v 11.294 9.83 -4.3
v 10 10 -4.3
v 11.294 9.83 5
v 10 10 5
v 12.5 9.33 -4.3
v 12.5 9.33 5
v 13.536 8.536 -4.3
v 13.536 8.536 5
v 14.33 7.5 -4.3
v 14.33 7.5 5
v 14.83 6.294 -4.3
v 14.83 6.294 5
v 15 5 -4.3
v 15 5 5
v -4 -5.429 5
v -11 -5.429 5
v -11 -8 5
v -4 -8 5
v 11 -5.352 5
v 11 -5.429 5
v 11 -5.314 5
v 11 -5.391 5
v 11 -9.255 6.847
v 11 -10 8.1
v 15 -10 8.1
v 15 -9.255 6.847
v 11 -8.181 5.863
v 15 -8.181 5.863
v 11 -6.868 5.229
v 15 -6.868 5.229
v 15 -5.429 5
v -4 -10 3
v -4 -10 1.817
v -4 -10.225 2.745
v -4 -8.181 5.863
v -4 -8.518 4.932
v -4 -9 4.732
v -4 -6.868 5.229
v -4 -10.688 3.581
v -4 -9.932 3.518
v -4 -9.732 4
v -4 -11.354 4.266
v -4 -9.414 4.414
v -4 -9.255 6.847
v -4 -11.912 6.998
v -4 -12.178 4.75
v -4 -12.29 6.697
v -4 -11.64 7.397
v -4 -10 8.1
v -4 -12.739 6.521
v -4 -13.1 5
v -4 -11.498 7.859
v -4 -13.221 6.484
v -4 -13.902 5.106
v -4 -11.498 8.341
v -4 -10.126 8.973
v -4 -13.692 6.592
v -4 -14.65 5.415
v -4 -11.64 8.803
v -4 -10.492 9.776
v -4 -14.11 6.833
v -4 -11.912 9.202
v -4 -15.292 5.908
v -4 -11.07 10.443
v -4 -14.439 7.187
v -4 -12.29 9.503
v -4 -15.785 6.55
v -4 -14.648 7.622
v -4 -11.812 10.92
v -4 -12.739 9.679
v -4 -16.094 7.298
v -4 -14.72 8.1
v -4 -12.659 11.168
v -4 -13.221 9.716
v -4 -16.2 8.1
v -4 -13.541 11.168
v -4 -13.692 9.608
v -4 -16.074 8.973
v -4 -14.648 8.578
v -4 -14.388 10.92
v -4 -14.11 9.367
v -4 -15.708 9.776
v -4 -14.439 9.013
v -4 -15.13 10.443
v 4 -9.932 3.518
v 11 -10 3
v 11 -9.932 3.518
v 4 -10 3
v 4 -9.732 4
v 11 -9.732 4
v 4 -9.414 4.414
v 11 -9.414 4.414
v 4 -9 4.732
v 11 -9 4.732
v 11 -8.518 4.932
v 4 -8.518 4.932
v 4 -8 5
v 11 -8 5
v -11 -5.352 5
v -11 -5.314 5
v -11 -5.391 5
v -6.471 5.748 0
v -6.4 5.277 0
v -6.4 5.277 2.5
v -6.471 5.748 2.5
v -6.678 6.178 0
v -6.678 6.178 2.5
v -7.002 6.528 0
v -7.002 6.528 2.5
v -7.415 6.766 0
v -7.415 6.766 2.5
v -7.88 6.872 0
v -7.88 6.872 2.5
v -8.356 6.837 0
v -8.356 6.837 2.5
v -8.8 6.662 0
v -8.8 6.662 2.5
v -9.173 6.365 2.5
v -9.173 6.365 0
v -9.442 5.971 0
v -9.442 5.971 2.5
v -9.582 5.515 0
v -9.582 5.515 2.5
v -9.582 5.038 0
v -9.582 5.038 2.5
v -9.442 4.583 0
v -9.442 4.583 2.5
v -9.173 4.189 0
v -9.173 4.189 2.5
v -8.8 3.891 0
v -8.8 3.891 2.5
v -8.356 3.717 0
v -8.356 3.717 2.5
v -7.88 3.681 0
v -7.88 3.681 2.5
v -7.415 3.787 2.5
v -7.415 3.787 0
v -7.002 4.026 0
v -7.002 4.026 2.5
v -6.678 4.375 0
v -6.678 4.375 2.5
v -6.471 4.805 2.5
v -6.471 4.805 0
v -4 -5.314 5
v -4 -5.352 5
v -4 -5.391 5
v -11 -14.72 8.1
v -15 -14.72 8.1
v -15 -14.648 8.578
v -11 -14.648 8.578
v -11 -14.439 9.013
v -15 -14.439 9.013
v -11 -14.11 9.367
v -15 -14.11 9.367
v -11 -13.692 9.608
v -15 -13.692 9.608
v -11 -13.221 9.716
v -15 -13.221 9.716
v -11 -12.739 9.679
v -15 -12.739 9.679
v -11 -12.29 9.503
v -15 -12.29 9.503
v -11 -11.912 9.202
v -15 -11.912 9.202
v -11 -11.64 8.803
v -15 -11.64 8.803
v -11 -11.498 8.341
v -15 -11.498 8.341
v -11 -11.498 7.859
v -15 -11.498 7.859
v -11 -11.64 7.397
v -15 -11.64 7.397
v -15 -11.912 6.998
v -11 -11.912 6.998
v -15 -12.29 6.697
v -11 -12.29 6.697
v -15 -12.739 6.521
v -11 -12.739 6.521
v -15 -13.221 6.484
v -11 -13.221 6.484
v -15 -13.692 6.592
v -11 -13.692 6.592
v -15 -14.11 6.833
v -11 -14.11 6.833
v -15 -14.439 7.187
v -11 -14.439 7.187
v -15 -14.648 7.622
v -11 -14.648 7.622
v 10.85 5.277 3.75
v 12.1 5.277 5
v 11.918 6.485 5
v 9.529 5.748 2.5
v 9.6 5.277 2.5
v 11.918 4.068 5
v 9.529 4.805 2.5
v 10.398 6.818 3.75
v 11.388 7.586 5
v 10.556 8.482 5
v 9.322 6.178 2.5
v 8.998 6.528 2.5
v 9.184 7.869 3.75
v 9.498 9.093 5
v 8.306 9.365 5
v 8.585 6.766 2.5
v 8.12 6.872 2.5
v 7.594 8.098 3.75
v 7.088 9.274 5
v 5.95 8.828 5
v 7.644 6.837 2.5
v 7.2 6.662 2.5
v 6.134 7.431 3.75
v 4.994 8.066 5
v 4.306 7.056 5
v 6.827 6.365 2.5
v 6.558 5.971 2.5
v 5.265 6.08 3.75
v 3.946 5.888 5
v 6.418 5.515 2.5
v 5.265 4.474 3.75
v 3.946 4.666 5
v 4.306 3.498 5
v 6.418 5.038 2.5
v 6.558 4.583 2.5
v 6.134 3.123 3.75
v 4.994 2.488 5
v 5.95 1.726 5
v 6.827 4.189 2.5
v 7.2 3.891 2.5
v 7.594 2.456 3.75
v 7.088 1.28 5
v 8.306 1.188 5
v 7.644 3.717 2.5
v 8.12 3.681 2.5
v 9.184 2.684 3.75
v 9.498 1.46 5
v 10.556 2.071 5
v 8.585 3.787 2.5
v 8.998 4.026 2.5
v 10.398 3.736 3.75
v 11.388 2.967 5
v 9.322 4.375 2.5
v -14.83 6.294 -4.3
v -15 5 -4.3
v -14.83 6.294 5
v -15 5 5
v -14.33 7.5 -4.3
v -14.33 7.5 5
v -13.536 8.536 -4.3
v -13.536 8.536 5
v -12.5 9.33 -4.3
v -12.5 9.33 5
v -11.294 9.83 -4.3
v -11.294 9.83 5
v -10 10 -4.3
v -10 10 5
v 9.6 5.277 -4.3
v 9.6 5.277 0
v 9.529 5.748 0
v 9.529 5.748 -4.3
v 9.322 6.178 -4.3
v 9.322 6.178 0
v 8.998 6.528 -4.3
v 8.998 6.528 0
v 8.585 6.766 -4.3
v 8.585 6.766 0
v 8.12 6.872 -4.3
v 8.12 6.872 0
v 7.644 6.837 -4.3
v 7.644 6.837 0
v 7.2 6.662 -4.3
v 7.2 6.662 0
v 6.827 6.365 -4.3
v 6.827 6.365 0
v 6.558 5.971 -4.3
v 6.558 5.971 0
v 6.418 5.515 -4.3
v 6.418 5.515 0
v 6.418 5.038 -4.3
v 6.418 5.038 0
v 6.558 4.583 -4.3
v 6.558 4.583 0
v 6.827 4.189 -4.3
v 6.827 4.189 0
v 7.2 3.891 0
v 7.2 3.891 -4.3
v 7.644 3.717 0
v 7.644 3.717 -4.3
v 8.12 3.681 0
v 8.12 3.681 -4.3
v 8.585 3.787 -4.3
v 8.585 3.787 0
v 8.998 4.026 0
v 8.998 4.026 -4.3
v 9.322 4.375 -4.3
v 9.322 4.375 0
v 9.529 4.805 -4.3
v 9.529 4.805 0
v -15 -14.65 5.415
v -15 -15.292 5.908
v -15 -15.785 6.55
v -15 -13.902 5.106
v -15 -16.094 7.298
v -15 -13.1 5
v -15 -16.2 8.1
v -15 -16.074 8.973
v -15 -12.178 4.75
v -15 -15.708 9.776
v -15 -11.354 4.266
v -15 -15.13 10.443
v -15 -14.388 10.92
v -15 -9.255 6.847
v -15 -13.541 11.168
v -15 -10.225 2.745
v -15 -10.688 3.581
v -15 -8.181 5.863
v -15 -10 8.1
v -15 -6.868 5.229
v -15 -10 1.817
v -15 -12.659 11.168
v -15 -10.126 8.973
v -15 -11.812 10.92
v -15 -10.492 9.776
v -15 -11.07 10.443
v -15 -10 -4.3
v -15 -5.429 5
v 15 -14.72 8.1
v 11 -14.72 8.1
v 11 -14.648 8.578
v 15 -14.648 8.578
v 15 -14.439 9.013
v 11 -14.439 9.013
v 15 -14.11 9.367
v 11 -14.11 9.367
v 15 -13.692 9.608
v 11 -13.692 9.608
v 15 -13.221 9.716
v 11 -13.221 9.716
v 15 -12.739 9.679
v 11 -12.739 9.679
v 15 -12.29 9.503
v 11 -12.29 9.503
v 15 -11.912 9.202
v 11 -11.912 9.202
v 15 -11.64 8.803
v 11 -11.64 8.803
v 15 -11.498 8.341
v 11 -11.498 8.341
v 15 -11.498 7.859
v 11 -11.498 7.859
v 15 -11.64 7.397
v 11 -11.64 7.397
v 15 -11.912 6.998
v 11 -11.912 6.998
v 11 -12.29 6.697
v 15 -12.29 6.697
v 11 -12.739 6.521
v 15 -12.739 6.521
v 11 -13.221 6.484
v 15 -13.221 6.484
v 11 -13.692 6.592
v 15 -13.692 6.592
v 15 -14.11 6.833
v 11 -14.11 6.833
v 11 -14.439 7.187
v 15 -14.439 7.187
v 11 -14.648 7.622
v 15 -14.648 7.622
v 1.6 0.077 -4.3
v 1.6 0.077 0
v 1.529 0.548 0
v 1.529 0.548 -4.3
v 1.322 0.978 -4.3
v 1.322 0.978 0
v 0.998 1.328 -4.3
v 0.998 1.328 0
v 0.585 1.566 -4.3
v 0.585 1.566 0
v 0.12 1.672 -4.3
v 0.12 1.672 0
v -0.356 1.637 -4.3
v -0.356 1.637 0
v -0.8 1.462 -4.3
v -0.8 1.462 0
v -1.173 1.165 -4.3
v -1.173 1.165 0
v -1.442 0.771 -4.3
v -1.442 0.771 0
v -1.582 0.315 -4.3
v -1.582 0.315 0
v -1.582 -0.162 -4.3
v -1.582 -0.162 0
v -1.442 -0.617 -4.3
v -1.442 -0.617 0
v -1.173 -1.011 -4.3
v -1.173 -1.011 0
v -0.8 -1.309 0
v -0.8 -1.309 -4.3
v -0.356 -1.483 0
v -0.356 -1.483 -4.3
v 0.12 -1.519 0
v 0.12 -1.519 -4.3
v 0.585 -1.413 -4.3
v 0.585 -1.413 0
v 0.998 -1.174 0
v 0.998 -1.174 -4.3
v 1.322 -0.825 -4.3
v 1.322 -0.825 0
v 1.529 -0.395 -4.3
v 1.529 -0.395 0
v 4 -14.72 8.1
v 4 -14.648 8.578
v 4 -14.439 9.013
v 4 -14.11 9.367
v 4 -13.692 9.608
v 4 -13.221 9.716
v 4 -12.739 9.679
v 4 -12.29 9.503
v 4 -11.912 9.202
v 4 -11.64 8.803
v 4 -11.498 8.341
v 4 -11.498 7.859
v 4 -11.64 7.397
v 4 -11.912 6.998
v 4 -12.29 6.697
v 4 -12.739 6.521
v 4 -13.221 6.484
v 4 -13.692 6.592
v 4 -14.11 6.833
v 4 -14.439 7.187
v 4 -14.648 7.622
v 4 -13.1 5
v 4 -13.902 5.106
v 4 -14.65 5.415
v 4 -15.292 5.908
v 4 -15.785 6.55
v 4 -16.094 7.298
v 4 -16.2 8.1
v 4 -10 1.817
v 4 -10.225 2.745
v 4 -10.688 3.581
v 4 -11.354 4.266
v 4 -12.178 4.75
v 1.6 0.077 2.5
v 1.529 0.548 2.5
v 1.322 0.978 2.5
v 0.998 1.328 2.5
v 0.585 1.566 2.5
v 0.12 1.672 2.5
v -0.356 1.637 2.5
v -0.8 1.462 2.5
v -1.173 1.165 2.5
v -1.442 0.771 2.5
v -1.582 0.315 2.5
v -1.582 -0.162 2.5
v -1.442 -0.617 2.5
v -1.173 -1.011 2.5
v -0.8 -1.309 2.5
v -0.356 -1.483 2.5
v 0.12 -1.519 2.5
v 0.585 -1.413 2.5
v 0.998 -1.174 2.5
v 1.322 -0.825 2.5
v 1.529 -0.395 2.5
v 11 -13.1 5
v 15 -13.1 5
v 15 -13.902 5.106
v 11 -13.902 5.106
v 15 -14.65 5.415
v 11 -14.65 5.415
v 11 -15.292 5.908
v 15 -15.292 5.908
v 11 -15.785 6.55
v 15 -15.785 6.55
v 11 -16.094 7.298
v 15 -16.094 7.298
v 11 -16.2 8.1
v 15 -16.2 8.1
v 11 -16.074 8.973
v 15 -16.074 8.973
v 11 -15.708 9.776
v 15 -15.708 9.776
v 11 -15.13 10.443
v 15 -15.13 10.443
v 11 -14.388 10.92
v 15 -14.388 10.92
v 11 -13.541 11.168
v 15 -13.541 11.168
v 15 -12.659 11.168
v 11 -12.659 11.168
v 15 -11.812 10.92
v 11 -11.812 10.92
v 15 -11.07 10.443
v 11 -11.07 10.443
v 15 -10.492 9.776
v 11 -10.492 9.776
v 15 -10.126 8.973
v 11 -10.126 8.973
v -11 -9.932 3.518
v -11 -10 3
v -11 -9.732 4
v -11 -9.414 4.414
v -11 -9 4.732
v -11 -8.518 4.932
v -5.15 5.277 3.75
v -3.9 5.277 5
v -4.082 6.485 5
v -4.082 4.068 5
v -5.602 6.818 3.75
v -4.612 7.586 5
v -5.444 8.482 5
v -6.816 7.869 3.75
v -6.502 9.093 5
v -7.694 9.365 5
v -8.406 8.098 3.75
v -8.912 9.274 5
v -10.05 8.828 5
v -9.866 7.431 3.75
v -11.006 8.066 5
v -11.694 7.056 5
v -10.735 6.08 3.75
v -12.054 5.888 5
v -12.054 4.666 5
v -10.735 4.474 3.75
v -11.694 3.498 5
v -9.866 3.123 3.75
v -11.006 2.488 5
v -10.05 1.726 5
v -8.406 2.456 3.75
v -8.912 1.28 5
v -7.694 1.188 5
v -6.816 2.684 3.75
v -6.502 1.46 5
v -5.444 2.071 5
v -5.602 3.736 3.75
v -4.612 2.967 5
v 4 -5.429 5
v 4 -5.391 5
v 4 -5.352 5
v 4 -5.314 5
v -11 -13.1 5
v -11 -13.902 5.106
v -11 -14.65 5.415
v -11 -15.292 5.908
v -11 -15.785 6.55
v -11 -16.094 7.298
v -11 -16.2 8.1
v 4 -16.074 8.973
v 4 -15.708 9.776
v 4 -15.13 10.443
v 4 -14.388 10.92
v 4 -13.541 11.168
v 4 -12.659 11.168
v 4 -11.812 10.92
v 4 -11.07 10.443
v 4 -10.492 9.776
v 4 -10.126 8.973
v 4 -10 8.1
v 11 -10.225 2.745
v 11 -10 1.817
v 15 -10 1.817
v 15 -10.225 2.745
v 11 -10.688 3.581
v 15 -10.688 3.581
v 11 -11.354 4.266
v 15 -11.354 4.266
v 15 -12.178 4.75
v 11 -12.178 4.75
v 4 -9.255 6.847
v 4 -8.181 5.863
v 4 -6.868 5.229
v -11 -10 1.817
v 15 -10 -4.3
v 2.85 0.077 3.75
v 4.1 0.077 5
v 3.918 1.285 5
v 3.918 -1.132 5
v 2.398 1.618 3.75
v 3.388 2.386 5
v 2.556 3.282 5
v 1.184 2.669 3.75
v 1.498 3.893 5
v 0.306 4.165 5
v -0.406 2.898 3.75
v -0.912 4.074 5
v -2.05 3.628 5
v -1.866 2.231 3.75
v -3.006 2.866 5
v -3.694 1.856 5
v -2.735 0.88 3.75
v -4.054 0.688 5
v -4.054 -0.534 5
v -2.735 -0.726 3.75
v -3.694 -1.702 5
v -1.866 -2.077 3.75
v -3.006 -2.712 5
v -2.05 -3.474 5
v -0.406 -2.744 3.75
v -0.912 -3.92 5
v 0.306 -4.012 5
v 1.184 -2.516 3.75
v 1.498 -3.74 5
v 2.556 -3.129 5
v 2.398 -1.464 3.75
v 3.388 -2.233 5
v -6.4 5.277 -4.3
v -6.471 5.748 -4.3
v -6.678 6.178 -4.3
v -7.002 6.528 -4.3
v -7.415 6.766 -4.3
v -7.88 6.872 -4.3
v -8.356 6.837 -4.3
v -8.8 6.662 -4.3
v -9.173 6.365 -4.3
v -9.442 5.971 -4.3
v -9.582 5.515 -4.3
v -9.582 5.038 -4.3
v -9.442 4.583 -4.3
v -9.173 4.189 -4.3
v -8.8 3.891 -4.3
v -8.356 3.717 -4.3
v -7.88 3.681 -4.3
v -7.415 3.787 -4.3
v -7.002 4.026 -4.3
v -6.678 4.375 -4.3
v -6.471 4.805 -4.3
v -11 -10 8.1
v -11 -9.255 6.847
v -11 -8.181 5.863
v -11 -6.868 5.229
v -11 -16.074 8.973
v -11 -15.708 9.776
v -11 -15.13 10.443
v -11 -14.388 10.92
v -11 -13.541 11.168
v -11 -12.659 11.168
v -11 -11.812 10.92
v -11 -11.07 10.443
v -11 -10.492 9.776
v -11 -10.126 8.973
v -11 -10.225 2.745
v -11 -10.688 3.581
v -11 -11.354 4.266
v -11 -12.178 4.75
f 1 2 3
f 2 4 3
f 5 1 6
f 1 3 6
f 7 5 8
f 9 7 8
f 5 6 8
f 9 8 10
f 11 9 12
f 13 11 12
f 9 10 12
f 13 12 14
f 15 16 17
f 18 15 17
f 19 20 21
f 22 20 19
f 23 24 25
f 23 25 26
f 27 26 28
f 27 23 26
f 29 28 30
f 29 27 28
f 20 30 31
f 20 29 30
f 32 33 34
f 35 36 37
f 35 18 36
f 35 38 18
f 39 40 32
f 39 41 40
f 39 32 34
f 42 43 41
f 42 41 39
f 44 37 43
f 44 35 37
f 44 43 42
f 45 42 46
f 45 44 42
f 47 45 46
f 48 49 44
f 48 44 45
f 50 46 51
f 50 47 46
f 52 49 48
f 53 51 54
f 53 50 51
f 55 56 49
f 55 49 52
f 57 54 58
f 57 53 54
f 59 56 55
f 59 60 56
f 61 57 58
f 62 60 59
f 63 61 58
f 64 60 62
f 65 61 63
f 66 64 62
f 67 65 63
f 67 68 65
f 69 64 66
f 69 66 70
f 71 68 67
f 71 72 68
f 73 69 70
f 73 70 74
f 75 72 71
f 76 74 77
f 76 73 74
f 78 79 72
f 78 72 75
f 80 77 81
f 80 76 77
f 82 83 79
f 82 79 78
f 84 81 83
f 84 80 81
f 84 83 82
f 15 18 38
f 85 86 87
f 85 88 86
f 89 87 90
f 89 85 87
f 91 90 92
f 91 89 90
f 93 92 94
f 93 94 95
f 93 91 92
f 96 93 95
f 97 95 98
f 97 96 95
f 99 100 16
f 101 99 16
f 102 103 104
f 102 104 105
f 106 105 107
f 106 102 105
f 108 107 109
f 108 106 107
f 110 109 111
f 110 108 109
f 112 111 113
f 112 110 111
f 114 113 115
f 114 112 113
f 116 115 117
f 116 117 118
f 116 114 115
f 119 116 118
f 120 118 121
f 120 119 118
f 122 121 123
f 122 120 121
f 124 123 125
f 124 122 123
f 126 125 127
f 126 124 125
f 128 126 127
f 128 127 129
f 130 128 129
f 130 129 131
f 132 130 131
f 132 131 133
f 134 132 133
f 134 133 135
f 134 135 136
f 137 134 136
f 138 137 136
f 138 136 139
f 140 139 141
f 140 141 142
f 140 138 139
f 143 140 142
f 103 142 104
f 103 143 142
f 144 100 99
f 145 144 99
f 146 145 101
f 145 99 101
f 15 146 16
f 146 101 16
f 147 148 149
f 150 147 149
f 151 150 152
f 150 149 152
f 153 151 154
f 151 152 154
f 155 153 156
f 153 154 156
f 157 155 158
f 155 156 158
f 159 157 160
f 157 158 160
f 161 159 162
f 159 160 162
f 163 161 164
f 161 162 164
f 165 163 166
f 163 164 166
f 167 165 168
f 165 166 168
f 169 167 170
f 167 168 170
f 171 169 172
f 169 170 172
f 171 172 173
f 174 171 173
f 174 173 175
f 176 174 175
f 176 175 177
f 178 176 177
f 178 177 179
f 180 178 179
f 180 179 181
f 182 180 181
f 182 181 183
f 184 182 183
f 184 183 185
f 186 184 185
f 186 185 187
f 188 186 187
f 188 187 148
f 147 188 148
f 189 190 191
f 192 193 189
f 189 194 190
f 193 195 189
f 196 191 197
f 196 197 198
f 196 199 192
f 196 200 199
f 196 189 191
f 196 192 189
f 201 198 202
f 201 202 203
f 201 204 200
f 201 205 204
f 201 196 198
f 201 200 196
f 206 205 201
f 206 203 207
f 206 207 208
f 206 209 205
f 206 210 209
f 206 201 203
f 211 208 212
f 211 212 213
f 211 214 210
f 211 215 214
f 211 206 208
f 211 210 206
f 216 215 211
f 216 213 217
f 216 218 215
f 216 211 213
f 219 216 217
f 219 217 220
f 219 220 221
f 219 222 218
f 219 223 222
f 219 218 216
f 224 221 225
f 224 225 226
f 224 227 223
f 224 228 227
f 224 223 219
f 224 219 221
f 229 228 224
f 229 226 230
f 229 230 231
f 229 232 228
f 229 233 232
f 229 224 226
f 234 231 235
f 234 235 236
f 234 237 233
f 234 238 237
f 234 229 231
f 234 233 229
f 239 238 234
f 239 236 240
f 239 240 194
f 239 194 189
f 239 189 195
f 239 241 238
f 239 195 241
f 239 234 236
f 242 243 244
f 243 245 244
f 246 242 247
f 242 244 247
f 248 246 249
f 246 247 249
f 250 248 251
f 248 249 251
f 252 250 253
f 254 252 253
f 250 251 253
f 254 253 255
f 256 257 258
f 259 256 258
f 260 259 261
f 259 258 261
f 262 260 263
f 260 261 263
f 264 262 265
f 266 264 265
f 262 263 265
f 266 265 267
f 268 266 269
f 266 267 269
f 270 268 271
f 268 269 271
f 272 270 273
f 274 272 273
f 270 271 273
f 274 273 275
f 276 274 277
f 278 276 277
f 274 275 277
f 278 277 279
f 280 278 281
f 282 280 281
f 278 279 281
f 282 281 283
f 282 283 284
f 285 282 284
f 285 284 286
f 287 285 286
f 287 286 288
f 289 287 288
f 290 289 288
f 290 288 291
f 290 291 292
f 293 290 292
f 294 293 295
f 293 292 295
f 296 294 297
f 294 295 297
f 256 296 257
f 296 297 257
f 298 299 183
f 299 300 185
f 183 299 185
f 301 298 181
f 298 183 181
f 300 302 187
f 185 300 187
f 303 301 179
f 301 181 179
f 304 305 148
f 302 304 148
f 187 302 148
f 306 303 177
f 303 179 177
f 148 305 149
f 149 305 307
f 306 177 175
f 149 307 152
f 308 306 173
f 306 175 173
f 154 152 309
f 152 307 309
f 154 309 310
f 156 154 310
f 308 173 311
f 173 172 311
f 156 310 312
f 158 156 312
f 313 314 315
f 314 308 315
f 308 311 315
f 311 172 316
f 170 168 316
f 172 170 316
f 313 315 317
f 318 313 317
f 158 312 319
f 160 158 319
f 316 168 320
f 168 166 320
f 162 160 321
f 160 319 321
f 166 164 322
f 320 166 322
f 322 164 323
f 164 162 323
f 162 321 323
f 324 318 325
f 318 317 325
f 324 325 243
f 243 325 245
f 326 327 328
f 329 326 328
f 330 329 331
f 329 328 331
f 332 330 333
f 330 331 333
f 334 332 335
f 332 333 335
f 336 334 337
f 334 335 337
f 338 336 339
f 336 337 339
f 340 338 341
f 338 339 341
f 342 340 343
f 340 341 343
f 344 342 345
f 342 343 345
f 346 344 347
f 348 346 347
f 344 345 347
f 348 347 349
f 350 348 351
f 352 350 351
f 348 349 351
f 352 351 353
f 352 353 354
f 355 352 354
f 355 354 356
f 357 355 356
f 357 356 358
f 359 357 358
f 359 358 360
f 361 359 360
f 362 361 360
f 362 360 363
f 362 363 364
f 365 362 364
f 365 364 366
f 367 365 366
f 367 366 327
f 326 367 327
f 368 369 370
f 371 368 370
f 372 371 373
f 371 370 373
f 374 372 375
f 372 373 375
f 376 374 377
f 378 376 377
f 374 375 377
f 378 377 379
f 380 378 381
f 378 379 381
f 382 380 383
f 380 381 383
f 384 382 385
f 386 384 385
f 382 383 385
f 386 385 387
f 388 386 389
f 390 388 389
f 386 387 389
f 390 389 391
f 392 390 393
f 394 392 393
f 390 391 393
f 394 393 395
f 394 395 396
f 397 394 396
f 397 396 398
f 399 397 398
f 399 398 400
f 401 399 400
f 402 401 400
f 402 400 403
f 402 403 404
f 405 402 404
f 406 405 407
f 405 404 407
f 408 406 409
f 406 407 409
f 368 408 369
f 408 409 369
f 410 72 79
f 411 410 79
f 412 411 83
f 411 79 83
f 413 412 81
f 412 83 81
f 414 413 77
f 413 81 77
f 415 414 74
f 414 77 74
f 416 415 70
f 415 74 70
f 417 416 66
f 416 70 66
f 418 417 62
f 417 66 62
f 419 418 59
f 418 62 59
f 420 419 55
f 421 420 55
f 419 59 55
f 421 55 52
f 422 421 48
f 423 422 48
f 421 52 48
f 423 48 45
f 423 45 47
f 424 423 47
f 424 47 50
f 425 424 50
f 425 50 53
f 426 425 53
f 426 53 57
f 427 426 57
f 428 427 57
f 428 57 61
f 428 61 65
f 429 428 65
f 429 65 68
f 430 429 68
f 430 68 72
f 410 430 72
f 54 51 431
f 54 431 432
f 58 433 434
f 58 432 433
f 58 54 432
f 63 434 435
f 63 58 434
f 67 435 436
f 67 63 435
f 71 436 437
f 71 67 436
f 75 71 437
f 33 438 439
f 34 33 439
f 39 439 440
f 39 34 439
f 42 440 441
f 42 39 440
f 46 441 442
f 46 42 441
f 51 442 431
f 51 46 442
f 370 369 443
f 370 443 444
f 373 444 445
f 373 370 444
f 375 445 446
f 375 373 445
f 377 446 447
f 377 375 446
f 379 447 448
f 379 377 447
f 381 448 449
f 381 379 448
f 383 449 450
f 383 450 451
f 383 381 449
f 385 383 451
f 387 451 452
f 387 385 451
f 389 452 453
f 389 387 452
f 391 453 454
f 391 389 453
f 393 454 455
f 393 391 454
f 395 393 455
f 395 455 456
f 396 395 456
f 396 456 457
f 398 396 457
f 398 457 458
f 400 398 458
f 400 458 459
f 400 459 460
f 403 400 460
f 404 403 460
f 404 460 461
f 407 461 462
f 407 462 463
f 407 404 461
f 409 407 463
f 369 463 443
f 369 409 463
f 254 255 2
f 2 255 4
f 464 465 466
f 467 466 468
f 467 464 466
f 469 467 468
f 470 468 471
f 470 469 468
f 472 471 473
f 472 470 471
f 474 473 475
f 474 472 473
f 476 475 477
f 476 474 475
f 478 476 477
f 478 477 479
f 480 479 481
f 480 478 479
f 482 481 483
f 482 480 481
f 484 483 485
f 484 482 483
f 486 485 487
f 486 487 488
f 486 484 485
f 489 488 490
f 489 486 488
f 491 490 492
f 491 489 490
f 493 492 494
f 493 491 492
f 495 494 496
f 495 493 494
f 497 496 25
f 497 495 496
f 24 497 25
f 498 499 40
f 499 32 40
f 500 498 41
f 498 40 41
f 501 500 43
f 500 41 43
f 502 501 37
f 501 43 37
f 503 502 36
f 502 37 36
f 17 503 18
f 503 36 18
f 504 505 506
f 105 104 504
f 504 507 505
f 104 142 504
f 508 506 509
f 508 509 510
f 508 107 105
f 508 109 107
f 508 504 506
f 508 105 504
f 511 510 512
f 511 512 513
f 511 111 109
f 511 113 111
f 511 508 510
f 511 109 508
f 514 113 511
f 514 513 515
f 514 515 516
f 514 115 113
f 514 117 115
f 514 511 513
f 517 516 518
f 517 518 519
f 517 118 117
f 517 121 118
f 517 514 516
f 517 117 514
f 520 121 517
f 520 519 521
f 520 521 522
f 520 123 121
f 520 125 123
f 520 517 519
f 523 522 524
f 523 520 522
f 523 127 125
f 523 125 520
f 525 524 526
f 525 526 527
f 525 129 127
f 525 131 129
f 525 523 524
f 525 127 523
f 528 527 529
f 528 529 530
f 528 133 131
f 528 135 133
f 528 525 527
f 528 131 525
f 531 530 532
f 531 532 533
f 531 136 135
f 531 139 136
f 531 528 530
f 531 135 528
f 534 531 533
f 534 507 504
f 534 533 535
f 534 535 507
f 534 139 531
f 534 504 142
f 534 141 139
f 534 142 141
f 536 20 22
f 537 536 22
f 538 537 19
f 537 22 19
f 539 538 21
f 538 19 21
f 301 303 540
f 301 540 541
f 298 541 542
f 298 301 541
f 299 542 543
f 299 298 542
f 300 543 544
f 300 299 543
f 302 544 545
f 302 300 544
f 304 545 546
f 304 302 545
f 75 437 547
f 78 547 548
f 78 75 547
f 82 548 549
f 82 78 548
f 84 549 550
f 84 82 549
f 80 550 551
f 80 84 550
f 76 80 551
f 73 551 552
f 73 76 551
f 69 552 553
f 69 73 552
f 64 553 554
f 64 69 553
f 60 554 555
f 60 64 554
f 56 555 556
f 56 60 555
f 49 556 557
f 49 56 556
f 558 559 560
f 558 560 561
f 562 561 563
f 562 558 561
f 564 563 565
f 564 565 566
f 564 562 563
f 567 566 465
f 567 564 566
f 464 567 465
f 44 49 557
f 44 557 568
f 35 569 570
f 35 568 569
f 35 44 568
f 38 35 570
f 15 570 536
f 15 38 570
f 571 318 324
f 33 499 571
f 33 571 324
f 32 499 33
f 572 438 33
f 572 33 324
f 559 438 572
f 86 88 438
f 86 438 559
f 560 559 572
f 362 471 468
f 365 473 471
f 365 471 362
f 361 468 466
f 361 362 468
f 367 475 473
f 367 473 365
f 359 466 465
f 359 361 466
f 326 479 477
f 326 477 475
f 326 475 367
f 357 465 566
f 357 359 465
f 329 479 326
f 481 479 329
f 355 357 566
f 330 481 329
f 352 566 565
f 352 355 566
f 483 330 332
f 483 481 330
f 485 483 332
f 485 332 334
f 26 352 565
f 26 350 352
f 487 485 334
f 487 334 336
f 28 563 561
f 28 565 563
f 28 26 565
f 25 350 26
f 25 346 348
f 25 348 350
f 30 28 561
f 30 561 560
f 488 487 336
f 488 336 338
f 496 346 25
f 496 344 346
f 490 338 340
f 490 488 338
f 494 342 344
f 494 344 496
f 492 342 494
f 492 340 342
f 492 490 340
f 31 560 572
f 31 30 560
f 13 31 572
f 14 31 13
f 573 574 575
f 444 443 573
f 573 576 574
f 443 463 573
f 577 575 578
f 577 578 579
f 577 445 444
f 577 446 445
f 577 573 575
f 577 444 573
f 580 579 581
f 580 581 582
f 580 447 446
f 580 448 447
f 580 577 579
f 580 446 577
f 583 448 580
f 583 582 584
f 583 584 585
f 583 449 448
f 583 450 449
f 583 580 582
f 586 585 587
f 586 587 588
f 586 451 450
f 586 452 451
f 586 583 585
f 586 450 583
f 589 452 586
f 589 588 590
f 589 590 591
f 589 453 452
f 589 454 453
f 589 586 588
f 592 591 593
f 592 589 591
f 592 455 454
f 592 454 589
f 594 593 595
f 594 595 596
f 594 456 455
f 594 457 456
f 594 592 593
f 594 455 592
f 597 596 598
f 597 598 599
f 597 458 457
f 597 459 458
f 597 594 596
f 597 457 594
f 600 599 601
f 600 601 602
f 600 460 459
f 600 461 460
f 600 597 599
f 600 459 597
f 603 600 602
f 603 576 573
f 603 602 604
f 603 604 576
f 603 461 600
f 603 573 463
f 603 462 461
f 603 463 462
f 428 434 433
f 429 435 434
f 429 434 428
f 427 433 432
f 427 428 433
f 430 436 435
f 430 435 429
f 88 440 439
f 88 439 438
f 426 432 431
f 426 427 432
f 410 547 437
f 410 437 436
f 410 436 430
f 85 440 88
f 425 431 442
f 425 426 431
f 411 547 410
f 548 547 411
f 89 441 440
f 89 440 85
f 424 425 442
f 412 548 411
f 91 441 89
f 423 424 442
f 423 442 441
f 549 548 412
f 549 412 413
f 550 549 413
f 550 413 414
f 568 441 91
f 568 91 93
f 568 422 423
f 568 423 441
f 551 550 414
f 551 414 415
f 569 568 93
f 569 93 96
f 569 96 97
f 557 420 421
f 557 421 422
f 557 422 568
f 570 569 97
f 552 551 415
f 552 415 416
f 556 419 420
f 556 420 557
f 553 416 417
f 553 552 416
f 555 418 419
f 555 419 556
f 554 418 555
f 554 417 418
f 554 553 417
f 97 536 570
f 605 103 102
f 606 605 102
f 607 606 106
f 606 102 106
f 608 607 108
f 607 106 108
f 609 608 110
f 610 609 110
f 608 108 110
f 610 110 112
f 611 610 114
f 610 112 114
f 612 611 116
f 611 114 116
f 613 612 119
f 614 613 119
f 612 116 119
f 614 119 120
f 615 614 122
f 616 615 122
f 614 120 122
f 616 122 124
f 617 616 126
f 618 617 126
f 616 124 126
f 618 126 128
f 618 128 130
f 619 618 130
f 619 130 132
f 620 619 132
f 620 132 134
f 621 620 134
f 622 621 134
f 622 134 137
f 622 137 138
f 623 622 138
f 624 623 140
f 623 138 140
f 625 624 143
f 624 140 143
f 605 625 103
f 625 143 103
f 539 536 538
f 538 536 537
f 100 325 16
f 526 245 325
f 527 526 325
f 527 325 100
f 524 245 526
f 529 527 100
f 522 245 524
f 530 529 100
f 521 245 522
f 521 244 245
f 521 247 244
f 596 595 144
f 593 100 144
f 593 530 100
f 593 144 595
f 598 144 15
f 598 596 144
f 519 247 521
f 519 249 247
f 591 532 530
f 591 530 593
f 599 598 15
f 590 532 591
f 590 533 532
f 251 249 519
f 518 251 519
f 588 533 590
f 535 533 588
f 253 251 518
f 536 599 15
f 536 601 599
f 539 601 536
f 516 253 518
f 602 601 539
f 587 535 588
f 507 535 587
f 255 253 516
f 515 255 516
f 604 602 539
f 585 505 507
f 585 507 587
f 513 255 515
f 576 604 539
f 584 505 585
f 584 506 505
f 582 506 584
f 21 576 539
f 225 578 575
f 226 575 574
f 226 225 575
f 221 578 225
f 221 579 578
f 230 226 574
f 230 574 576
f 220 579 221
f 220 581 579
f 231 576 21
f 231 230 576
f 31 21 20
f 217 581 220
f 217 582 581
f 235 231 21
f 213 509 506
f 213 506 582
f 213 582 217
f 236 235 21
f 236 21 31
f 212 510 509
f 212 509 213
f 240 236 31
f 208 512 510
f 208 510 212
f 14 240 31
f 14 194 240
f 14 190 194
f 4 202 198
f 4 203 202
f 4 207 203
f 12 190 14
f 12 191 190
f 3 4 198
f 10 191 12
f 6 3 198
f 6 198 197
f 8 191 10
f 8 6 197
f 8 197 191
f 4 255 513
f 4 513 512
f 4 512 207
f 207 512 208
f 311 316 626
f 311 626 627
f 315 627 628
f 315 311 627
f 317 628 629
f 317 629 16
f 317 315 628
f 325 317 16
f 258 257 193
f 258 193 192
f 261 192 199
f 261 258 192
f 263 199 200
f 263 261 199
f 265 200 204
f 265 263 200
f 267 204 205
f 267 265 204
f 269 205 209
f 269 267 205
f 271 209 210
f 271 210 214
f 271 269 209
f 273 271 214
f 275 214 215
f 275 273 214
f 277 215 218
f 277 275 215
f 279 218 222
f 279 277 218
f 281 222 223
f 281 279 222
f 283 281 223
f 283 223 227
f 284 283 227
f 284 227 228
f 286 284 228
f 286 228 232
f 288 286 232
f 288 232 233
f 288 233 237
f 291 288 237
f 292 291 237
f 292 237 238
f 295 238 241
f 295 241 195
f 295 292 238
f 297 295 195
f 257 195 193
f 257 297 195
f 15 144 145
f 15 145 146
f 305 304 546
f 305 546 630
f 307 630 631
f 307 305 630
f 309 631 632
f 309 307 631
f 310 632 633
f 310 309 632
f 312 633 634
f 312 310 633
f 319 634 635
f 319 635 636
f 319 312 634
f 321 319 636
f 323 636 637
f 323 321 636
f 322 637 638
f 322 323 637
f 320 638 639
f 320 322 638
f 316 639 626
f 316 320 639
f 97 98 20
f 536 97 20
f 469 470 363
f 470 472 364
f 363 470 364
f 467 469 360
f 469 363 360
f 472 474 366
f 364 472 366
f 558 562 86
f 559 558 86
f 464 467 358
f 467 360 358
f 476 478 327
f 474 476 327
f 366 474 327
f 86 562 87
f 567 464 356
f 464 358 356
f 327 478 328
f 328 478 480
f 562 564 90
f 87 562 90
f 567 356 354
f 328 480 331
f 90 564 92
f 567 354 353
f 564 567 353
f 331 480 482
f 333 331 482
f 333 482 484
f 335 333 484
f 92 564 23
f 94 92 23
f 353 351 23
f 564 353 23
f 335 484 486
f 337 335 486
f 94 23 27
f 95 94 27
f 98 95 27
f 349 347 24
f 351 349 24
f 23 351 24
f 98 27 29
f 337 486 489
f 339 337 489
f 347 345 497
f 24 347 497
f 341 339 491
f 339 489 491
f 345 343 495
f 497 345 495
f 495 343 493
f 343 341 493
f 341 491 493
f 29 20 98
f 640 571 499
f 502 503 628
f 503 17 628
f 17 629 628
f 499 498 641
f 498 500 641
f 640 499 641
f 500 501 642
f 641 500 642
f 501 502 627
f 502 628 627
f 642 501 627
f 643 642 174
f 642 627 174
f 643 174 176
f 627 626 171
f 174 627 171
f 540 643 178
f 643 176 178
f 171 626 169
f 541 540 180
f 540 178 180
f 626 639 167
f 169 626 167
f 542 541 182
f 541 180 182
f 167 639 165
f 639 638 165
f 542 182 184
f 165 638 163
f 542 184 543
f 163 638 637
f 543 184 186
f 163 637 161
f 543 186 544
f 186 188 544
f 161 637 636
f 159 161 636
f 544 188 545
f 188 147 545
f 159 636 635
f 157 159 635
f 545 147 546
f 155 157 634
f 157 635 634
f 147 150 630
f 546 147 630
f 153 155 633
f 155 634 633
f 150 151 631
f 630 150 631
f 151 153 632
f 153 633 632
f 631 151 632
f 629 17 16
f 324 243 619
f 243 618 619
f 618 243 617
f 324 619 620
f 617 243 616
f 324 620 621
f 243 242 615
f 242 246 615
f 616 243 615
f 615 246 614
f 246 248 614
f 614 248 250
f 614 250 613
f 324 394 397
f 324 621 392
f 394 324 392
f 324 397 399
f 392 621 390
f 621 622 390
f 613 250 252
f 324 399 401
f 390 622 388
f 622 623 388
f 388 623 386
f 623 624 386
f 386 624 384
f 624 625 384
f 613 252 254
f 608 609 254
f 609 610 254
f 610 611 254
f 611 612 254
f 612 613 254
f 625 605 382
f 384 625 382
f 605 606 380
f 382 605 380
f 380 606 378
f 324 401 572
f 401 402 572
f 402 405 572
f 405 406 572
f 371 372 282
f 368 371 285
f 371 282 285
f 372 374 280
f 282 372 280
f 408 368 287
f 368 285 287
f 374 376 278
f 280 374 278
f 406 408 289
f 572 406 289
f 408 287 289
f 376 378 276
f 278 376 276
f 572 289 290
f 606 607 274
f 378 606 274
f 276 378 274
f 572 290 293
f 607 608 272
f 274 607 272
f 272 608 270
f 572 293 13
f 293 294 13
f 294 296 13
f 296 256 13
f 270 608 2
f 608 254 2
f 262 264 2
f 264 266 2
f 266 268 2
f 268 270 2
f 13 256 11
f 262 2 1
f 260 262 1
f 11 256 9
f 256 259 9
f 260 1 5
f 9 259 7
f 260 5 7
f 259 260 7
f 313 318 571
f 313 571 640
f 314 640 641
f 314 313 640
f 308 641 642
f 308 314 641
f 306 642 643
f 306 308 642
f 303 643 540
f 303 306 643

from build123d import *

# Parameters (mm, degrees)
F0_W      = 30
F0_H      = 20
F0_R      = 1.6
F1_DEPTH  = 5
F3_DEPTH  = 30
F7_DEPTH  = 7
F9_DEPTH  = 7
F10_SIZE  = 2.5
F11_R     = 5
F12_R     = 1.6200998357
F13_DEPTH = 30.001
F14_R     = 2
F15_DEPTH = 4.3


with BuildPart() as f1:
    # F0 (on Top) → F1 (new body)
    with BuildSketch(Plane.XY):
        Rectangle(F0_W, F0_H)
        with Locations((-8, 5.2767994255)):
            Circle(F0_R, mode=Mode.SUBTRACT)
        with Locations((0, 0.0767994255)):
            Circle(F0_R, mode=Mode.SUBTRACT)
        with Locations((8, 5.2767994255)):
            Circle(F0_R, mode=Mode.SUBTRACT)
    extrude(amount=F1_DEPTH)

    # F2 (on face) → F3 (join, through all)
    with BuildSketch(Plane(origin=(-15, 0, 0), x_dir=(0, -1, 0), z_dir=(-1, 0, 0))):
        with BuildLine():
            ThreePointArc((13.1, 5), (15.2920310217, 5.9079689783), (16.2, 8.1))
            ThreePointArc((16.2, 8.1), (13.1, 11.2), (10, 8.1))
            ThreePointArc((10, 8.1), (10.9079689783, 5.9079689783), (13.1, 5))
        make_face()
        with BuildLine():
            ThreePointArc((13.1, 5), (10.9079689783, 5.9079689783), (10, 8.1))
            ThreePointArc((10, 8.1), (8.1808280522, 5.8625059643), (5.4291286506, 5))
            Line((5.4291286506, 5), (10, 5))
            Line((10, 5), (10, 1.816622098))
            ThreePointArc((10, 1.816622098), (10.998268655, 3.9455916428), (13.1, 5))
        make_face()
    extrude(amount=-F3_DEPTH)

    # F6 (on offset) → F7 (cut)
    with BuildSketch(Plane.YZ.offset(11)):
        with BuildLine():
            ThreePointArc((-13.1, 5), (-10.9079689783, 5.9079689783), (-10, 8.1))
            ThreePointArc((-10, 8.1), (-15.2920310217, 10.2920310217), (-13.1, 5))
        make_face()
        with BuildLine():
            ThreePointArc((-5.4291286506, 5), (-8.1808280522, 5.8625059643), (-10, 8.1))
            ThreePointArc((-10, 8.1), (-10.9079689783, 5.9079689783), (-13.1, 5))
            ThreePointArc((-13.1, 5), (-10.998268655, 3.9455916428), (-10, 1.816622098))
            Line((-10, 1.816622098), (-10, 5))
            Line((-10, 5), (-5.4291286506, 5))
        make_face()
        with BuildLine():
            Line((-5.3136004135, 5), (-5.4291286506, 5))
            ThreePointArc((-5.4291286506, 5), (-5.371364532, 4.9996666743), (-5.3136004135, 5))
        make_face()
    extrude(amount=-F7_DEPTH, mode=Mode.SUBTRACT)

    # F8 (on offset) → F9 (cut)
    with BuildSketch(Plane(origin=(-11, 0, 0), x_dir=(0, -1, 0), z_dir=(-1, 0, 0))):
        with BuildLine():
            ThreePointArc((13.1, 5), (15.2920310217, 5.9079689783), (16.2, 8.1))
            ThreePointArc((16.2, 8.1), (13.1, 11.2), (10, 8.1))
            ThreePointArc((10, 8.1), (10.9079689783, 5.9079689783), (13.1, 5))
        make_face()
        with BuildLine():
            ThreePointArc((5.3136004135, 5), (5.371364532, 4.9996666743), (5.4291286506, 5))
            Line((5.4291286506, 5), (5.3136004135, 5))
        make_face()
        with BuildLine():
            ThreePointArc((13.1, 5), (10.9079689783, 5.9079689783), (10, 8.1))
            ThreePointArc((10, 8.1), (8.1808280522, 5.8625059643), (5.4291286506, 5))
            Line((5.4291286506, 5), (10, 5))
            Line((10, 5), (10, 1.816622098))
            ThreePointArc((10, 1.816622098), (10.998268655, 3.9455916428), (13.1, 5))
        make_face()
    extrude(amount=-F9_DEPTH, mode=Mode.SUBTRACT)

    # F10
    f10_edges = [f1.edges().sort_by_distance(p)[0] for p in [
        (-9.6, 5.276799, 5),
        (-1.6, 0.076799, 5),
        (6.4, 5.276799, 5),
    ]]
    chamfer(f10_edges, length=F10_SIZE)

    # F11
    f11_edges = [f1.edges().sort_by_distance(p)[0] for p in [
        (-15, 10, 2.5),
        (15, 10, 2.5),
    ]]
    fillet(f11_edges, radius=F11_R)

    # F12 (on face) → F13 (cut, through all)
    with BuildSketch(Plane(origin=(-15, 0, 0), x_dir=(0, -1, 0), z_dir=(-1, 0, 0))):
        with Locations((13.1, 8.1)):
            Circle(F12_R)
    extrude(amount=-F13_DEPTH, mode=Mode.SUBTRACT)

    # F14
    f14_edges = [f1.edges().sort_by_distance(p)[0] for p in [
        (-7.5, -10, 5),
        (7.5, -10, 5),
    ]]
    fillet(f14_edges, radius=F14_R)

    # F15 (add): a face of the model
    f15_faces = [f1.faces().sort_by_distance(p)[0] for p in [
        (14.6394448725, -2.5, 0),
    ]]
    extrude(f15_faces, amount=F15_DEPTH)


solid = f1.part
